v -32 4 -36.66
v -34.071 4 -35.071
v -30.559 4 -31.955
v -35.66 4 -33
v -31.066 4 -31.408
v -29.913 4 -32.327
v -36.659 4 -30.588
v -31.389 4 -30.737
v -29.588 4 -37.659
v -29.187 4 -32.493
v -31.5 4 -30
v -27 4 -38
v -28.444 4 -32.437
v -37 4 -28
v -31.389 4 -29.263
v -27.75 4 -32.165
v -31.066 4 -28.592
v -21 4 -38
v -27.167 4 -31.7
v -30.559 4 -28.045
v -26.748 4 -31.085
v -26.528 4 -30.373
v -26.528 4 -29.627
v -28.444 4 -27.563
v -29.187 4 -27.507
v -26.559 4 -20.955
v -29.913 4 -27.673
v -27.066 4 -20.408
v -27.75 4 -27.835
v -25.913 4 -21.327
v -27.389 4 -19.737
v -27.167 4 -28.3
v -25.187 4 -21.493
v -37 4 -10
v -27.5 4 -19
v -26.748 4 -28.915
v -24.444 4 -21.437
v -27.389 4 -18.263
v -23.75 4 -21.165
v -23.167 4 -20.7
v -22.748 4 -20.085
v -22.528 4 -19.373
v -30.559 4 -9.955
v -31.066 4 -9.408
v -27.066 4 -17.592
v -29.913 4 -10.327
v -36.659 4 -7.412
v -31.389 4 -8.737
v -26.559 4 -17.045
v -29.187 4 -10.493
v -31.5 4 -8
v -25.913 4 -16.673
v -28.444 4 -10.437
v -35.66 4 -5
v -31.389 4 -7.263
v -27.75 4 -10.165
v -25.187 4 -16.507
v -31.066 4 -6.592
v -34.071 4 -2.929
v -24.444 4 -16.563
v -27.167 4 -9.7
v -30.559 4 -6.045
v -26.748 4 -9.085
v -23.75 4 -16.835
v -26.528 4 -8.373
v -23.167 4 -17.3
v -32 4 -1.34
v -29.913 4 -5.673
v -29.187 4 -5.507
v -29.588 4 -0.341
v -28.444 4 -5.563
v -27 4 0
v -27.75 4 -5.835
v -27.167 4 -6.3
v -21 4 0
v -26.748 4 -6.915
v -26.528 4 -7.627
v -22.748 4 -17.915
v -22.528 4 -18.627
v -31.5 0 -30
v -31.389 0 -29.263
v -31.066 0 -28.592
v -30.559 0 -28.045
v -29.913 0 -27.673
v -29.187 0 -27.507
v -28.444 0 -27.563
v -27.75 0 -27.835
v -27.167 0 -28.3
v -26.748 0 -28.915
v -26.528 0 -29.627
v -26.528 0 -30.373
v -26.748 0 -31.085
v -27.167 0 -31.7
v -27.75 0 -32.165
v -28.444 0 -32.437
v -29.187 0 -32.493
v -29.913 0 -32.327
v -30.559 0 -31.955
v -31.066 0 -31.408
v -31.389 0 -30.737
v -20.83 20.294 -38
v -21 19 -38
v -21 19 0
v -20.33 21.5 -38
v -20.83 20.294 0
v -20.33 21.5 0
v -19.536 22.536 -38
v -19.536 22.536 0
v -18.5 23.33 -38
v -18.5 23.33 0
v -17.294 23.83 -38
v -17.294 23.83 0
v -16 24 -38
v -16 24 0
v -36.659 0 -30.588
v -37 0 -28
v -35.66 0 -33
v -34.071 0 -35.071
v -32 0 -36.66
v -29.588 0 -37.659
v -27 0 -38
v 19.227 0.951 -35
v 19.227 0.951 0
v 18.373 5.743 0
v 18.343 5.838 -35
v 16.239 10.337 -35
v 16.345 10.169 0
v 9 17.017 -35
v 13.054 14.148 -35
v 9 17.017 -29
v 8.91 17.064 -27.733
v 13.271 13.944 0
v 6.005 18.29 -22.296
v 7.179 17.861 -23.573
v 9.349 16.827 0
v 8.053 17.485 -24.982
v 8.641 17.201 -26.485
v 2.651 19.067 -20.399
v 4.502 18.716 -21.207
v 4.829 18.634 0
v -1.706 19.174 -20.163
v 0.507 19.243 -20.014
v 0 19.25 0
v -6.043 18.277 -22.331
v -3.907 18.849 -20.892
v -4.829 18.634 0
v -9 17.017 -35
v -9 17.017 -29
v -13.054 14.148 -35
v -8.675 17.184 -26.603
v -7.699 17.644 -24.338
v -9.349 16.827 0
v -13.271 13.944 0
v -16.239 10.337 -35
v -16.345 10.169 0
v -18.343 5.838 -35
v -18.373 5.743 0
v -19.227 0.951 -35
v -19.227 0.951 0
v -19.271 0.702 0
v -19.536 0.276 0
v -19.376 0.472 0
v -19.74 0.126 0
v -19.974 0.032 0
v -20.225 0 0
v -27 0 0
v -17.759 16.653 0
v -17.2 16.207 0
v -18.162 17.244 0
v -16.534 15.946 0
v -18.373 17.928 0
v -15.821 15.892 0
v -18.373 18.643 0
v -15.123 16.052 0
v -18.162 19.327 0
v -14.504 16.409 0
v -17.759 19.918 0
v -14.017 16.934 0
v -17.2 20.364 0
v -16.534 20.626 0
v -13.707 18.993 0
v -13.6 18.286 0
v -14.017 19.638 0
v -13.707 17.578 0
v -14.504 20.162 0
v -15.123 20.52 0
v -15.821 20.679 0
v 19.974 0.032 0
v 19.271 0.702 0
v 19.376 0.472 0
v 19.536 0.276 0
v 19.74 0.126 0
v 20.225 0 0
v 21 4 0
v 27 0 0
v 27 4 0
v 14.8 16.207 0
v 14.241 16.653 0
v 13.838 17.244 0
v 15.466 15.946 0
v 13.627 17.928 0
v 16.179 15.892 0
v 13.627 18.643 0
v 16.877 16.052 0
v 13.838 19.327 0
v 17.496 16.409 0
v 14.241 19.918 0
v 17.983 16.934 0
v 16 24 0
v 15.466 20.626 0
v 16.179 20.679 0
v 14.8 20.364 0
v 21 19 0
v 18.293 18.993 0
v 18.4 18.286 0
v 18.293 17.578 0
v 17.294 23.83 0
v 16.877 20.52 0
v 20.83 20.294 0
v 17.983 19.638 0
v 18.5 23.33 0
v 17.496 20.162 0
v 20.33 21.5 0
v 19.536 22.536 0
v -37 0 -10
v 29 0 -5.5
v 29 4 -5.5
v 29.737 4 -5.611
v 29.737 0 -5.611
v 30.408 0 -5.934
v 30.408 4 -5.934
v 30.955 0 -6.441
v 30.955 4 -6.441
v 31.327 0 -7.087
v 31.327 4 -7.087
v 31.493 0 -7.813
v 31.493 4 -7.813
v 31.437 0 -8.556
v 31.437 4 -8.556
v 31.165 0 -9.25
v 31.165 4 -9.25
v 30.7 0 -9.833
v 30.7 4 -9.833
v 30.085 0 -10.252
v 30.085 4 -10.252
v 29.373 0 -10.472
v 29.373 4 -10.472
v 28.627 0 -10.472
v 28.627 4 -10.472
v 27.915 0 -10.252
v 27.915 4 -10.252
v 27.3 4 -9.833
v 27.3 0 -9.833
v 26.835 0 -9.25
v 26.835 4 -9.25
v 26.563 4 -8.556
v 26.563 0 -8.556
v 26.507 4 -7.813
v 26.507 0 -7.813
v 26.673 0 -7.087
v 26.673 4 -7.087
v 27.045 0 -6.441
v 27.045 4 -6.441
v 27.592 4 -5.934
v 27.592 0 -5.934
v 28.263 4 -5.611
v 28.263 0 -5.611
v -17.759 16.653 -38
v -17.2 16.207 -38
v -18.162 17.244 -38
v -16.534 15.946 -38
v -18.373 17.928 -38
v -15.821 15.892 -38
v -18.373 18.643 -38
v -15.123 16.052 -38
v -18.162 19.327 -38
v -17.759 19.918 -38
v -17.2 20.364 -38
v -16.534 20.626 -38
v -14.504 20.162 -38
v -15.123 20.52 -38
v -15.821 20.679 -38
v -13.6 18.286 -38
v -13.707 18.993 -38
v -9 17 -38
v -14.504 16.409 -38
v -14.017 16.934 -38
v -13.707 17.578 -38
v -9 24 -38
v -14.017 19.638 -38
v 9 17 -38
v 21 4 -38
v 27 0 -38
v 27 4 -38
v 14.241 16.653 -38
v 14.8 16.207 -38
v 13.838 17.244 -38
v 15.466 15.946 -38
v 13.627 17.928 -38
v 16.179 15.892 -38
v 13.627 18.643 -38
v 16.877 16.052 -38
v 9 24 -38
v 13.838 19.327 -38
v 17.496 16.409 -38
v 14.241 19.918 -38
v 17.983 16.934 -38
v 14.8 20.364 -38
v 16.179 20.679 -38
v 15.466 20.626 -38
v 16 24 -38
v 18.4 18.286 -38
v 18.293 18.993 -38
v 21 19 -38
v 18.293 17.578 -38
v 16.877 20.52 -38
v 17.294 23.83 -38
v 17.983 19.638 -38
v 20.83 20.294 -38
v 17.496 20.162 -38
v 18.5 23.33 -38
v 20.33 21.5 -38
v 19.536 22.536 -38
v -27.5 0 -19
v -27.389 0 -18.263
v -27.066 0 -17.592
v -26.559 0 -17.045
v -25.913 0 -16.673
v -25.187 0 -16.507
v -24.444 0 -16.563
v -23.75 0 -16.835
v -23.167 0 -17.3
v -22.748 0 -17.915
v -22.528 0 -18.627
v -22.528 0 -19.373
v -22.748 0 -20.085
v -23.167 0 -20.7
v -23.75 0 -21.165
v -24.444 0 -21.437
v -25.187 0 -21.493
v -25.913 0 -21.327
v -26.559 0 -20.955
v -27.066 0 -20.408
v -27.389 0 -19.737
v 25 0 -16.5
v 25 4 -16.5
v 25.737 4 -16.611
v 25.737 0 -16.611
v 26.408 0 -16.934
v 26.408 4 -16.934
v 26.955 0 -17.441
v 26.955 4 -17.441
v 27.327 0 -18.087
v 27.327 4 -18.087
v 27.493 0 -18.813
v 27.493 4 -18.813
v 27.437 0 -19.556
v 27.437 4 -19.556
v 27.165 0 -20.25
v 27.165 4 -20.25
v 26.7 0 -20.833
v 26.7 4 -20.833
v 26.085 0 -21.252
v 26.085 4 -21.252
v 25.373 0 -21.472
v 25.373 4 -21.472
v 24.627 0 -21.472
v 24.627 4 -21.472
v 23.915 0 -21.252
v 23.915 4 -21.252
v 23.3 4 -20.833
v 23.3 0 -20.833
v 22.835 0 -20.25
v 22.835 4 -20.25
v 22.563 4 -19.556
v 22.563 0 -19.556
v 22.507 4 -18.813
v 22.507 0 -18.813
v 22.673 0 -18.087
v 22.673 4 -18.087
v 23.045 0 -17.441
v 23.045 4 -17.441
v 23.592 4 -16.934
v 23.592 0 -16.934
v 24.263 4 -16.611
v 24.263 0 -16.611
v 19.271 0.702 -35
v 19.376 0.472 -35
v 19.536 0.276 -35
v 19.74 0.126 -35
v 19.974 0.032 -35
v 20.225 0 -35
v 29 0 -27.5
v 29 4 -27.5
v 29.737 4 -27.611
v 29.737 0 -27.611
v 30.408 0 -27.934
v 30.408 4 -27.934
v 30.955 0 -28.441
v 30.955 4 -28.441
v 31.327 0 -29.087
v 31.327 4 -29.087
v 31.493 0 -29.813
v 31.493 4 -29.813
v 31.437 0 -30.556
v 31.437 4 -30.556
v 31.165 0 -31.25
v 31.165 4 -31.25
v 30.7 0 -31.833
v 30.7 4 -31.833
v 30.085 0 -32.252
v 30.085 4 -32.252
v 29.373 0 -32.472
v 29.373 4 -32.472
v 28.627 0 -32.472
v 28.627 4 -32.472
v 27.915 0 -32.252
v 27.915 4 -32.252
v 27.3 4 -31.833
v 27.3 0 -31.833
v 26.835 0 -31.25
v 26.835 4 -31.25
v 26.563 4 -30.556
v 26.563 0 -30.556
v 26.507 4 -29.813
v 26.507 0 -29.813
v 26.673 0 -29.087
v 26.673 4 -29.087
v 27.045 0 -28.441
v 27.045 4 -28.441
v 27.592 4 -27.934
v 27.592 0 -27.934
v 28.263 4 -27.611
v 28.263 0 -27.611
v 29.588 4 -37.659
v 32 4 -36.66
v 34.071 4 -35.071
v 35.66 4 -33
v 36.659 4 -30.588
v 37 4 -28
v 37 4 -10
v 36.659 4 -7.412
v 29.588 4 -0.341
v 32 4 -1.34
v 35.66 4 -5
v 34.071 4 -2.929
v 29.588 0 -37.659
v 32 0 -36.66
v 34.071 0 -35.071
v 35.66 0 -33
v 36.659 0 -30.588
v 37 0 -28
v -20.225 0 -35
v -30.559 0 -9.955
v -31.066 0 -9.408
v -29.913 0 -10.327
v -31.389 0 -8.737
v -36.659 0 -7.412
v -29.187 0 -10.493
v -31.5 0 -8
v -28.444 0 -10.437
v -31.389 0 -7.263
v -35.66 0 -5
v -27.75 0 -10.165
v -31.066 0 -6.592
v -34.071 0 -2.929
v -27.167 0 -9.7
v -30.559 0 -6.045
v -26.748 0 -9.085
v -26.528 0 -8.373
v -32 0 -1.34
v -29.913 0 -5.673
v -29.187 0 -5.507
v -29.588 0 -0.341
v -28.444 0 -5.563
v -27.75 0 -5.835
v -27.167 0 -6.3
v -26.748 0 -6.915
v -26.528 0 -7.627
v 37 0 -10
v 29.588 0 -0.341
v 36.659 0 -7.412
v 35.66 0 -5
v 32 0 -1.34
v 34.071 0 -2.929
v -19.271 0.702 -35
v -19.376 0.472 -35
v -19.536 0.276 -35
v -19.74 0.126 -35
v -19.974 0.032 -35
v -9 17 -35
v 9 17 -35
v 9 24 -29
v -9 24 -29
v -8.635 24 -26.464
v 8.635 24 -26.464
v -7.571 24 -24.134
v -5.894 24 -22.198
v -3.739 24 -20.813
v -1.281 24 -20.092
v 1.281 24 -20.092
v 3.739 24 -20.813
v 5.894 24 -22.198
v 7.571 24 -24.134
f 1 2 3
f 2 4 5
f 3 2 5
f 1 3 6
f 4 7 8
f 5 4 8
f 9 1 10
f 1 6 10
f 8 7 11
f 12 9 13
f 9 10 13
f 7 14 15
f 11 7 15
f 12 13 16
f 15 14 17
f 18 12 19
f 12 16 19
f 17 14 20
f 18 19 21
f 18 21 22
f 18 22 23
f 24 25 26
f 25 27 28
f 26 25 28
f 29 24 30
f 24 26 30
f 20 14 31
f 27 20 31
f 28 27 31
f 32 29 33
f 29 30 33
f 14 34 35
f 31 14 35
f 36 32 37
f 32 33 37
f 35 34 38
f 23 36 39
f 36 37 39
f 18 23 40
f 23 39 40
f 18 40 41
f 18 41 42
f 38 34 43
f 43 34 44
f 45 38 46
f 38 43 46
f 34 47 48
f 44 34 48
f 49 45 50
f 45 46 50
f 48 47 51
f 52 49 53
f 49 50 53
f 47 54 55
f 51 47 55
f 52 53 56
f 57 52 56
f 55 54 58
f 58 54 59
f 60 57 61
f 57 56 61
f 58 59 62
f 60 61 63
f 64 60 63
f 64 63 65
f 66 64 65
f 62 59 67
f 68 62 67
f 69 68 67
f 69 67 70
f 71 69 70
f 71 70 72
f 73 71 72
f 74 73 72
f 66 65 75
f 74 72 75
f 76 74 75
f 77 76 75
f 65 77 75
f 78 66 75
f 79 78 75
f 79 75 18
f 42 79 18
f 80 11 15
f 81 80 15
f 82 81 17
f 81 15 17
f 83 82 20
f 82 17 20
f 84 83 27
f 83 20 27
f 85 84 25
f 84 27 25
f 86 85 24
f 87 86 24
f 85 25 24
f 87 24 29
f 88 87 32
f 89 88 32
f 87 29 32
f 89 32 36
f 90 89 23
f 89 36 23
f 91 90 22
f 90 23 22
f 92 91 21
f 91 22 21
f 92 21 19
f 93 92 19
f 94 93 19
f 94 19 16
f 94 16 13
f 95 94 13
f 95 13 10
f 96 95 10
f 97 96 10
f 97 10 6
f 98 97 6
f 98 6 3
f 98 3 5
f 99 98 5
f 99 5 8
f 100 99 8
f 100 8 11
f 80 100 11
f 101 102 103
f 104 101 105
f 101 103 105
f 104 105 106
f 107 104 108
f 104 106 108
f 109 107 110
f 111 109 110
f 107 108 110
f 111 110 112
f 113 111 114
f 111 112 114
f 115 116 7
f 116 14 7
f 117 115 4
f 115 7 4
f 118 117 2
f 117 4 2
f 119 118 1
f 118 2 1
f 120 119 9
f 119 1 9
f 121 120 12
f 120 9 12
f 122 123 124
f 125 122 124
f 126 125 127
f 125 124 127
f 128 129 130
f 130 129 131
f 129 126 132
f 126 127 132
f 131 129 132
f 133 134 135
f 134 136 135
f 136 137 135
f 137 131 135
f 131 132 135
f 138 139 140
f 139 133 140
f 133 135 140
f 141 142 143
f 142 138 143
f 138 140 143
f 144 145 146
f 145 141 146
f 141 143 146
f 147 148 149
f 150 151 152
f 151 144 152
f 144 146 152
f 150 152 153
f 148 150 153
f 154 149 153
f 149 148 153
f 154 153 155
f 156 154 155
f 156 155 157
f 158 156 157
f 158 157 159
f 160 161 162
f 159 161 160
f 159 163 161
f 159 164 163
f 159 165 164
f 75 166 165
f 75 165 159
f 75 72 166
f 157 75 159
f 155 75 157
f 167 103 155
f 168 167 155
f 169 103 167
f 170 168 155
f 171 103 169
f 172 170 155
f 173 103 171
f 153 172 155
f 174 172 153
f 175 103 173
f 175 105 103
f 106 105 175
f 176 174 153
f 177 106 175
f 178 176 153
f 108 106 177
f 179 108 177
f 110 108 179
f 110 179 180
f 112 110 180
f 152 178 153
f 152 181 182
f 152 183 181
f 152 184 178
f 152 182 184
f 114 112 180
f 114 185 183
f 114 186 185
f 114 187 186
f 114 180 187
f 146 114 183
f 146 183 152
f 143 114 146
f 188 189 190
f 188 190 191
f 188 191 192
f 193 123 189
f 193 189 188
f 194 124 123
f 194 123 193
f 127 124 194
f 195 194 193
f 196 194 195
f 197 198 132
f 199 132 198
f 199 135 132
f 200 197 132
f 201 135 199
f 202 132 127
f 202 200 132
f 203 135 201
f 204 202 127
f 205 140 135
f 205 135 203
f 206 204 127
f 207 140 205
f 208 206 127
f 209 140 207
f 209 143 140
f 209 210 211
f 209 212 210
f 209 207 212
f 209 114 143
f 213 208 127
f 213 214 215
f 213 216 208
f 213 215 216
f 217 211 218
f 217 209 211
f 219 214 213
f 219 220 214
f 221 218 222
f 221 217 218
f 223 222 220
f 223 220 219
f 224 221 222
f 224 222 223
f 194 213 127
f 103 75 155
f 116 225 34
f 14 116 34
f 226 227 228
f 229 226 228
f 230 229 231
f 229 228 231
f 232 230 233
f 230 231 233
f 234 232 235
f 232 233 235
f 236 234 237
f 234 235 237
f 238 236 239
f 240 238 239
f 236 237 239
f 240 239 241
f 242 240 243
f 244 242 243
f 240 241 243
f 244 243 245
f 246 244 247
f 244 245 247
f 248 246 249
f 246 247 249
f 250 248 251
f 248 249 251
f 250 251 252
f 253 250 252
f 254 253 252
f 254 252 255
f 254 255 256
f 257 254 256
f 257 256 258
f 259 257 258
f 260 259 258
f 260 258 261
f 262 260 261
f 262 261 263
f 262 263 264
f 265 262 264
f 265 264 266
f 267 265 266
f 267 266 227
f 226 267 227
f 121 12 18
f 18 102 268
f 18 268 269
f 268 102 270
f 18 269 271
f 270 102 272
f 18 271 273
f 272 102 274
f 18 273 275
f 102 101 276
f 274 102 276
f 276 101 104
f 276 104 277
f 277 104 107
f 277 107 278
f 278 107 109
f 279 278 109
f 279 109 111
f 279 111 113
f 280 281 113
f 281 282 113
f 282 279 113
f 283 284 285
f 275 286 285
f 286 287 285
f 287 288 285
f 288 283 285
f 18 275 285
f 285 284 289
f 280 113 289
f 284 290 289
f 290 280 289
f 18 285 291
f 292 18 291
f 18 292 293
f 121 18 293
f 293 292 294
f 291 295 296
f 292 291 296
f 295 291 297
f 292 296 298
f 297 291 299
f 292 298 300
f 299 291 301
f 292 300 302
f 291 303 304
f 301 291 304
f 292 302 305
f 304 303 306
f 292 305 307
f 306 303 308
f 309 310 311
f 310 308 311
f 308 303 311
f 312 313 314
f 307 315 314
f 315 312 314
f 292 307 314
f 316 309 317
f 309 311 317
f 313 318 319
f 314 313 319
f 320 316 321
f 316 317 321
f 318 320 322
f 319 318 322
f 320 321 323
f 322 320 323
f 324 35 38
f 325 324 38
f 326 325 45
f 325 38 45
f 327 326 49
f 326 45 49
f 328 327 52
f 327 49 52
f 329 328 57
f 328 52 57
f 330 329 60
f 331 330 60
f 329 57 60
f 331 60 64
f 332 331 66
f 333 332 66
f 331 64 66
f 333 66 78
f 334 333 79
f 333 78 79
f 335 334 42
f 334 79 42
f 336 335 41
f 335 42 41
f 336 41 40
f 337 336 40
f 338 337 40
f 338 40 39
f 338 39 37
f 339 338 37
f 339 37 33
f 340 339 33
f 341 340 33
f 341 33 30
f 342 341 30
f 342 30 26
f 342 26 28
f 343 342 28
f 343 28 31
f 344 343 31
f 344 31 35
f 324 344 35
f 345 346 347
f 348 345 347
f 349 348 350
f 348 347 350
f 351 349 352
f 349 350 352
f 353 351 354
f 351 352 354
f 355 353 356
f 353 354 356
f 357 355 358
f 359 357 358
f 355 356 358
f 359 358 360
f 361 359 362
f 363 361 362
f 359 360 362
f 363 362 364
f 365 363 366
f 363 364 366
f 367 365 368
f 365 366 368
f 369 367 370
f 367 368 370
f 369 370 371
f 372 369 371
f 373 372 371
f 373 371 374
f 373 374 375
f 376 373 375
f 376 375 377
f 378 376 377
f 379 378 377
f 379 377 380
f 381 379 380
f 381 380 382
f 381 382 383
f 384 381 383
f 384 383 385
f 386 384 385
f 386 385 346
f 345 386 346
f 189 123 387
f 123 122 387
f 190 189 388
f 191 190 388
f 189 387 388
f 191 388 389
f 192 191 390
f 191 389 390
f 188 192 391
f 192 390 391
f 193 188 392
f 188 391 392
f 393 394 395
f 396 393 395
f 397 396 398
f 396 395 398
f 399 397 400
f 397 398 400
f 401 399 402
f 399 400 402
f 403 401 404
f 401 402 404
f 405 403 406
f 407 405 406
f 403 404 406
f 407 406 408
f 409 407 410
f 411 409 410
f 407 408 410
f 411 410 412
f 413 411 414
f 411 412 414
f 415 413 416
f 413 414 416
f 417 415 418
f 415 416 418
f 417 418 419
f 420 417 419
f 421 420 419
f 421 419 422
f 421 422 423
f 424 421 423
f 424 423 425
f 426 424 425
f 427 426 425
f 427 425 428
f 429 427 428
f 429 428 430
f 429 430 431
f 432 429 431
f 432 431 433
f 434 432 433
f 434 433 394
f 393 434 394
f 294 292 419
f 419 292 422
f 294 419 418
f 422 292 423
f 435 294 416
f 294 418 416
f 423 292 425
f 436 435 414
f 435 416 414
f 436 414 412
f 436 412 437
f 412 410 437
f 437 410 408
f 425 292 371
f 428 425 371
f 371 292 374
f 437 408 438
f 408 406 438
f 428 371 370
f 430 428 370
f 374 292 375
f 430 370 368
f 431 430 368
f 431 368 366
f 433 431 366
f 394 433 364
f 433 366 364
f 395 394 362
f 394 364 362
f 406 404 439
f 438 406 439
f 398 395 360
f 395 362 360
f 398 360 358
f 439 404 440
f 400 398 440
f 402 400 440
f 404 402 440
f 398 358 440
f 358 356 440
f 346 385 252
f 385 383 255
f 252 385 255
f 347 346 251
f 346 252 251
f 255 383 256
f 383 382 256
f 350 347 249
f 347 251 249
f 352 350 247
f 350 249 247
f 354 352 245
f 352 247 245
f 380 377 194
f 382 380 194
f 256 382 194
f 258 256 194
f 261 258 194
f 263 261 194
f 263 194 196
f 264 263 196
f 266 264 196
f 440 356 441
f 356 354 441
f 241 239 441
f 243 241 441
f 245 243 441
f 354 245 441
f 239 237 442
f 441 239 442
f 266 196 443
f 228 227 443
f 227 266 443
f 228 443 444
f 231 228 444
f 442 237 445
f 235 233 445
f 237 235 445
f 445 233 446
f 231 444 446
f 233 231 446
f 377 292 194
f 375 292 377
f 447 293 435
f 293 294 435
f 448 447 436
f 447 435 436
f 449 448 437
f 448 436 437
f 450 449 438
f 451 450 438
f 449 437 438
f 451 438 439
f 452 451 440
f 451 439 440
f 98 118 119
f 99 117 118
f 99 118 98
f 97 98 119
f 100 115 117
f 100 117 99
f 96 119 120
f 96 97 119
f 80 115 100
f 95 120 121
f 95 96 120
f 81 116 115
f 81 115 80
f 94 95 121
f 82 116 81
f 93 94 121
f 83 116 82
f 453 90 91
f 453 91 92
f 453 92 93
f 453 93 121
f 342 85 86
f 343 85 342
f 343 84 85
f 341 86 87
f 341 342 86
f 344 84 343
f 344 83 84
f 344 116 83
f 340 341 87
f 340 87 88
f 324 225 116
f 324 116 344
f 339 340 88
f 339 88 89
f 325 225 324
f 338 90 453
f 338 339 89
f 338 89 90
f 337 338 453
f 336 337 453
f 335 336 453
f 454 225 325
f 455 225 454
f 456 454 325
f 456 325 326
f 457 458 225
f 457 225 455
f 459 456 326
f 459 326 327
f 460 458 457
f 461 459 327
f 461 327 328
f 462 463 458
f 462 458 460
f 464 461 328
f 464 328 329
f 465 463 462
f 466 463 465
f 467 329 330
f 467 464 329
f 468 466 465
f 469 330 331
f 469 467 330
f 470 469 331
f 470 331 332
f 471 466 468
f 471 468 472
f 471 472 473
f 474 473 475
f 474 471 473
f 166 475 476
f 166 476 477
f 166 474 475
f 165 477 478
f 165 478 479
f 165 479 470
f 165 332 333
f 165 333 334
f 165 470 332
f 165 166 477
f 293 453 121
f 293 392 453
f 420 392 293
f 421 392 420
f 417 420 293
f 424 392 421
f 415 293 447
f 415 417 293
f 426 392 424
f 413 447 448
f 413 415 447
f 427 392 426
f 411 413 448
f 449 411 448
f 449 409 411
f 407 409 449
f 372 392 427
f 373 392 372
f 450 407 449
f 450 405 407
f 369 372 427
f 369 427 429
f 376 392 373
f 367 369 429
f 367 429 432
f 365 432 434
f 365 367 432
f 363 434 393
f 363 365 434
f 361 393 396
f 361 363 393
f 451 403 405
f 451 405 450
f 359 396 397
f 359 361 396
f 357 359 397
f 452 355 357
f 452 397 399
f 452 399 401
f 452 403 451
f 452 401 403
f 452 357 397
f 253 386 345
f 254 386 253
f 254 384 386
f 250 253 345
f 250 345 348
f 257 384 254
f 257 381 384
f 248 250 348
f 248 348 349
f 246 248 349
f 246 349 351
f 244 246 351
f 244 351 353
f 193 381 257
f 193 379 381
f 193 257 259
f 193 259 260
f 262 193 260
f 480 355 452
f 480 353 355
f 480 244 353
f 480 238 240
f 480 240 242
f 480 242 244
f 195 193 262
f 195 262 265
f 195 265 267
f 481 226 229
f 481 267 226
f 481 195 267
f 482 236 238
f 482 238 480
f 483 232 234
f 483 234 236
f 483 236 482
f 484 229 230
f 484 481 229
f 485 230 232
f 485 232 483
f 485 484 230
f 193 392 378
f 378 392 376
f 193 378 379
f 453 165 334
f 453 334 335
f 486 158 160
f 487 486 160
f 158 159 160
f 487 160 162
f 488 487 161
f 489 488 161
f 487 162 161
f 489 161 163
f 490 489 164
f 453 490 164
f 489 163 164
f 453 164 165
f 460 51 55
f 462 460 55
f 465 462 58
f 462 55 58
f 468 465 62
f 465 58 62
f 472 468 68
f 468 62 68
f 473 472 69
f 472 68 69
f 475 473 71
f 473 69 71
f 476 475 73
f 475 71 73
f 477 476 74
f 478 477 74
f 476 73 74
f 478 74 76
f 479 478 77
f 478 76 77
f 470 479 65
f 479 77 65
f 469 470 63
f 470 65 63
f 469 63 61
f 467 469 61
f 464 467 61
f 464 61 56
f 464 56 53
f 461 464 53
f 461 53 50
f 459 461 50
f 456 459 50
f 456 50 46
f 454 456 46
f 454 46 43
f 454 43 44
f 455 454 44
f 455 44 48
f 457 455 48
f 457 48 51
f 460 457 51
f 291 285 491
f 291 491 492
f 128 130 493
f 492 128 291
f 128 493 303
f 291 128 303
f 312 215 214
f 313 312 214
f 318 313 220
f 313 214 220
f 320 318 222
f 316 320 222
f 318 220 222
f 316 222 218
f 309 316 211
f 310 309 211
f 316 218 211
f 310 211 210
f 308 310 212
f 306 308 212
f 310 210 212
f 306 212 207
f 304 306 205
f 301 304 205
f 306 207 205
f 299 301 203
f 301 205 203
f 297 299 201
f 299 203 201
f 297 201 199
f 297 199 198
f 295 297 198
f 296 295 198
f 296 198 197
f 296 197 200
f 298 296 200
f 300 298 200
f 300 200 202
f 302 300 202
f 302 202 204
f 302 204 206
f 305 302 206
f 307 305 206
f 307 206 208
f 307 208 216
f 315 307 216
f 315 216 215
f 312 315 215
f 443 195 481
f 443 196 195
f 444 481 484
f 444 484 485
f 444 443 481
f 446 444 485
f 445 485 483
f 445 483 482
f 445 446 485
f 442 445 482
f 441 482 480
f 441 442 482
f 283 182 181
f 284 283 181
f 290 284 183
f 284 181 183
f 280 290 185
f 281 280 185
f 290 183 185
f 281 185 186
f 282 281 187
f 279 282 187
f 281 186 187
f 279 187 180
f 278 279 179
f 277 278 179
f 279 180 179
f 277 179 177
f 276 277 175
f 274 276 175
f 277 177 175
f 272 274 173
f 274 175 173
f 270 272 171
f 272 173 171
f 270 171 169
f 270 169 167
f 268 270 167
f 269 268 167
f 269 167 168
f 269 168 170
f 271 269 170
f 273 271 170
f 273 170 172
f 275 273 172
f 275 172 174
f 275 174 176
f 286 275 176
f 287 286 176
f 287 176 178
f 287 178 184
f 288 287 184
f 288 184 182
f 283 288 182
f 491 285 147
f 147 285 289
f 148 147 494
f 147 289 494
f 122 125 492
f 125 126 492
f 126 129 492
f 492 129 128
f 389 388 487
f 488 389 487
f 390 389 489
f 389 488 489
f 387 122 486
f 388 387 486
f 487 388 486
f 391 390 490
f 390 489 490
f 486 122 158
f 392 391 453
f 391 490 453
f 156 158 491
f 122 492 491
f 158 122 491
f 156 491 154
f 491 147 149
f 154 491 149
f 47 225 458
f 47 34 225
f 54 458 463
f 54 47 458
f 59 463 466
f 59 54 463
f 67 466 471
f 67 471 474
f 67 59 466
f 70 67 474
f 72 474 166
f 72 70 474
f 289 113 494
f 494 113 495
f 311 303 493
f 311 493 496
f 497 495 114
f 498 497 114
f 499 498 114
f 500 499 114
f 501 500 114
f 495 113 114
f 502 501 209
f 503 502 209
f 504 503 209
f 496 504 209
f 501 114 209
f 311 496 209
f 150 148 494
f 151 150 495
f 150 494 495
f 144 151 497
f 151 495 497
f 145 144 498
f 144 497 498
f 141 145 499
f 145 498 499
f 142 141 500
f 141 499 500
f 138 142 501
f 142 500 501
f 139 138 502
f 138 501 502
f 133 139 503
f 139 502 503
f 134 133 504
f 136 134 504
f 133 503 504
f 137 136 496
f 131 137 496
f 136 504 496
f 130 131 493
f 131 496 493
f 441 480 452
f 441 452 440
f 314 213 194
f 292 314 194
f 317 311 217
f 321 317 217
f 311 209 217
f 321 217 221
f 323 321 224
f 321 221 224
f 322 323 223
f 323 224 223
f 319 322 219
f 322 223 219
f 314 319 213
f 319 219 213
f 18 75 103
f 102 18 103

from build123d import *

# Parameters (mm, degrees)
SKETCH1_W           = 42
SKETCH1_H           = 48
SKETCH1_R           = 19.25
SKETCH1_R_2         = 2.4
BOSS_EXTRUDE1_DEPTH = 35
SKETCH4_W           = 19
SKETCH4_H           = 5
BOSS_EXTRUDE3_DEPTH = 35
CUT_EXTRUDE1_REACH  = 70.367
SKETCH5_R           = 2.5
BOSS_EXTRUDE4_DEPTH = 3
CUT_EXTRUDE2_REACH  = 62.166
SKETCH9_W           = 16
SKETCH9_H           = 4
BOSS_EXTRUDE6_DEPTH = 38
CUT_EXTRUDE3_REACH  = 58.683
SKETCH10_R          = 2.5
FILLET1_R           = 10
FILLET2_R           = 5
SKETCH11_R          = 2.4
CUT_EXTRUDE4_DEPTH  = 57.302753041
FILLET3_R           = 1
CUT_EXTRUDE7_DEPTH  = 7


with BuildPart() as part:
    # Sketch1 → Boss-Extrude1 (new body)
    with BuildSketch(Plane.XY):
        Rectangle(SKETCH1_W, SKETCH1_H)
        Circle(SKETCH1_R, mode=Mode.SUBTRACT)
        with Locations((-16, 18.285714286)):
            Circle(SKETCH1_R_2, mode=Mode.SUBTRACT)
        with Locations((16, 18.285714286)):
            Circle(SKETCH1_R_2, mode=Mode.SUBTRACT)
        with Locations((16, -18.285714286)):
            Circle(SKETCH1_R_2, mode=Mode.SUBTRACT)
        with Locations((-16, -18.285714286)):
            Circle(SKETCH1_R_2, mode=Mode.SUBTRACT)
    extrude(amount=-BOSS_EXTRUDE1_DEPTH)

    # Sketch4 → Boss-Extrude3 (add)
    with BuildSketch(Plane.XY):
        with Locations((-30.5, -21.5)):
            Rectangle(SKETCH4_W, SKETCH4_H)
        with Locations((30.5, -21.5)):
            Rectangle(SKETCH4_W, SKETCH4_H)
    extrude(amount=-BOSS_EXTRUDE3_DEPTH)

    # Sketch5 → Cut-Extrude1 (cut, up to next)
    with BuildSketch(Plane(origin=(0, -19, 0), x_dir=(1, 0, 0), z_dir=(0, 1, 0)), mode=Mode.PRIVATE) as cut_extrude1_sk1:
        with Locations(Location((-25, 19, 0), (0, 0, 270))):
            Circle(SKETCH5_R)
    cut_extrude1_tool1 = extrude(cut_extrude1_sk1.sketch, amount=-CUT_EXTRUDE1_REACH, mode=Mode.PRIVATE) & part.part
    # Sketch5 → Cut-Extrude1 (cut, up to next)
    with BuildSketch(Plane(origin=(0, -19, 0), x_dir=(1, 0, 0), z_dir=(0, 1, 0)), mode=Mode.PRIVATE) as cut_extrude1_sk2:
        with Locations(Location((25, 19, 0), (0, 0, 270))):
            Circle(SKETCH5_R)
    cut_extrude1_tool2 = extrude(cut_extrude1_sk2.sketch, amount=-CUT_EXTRUDE1_REACH, mode=Mode.PRIVATE) & part.part
    add(cut_extrude1_tool1.solids().sort_by_distance((-25, -19, -19))[0], mode=Mode.SUBTRACT)
    add(cut_extrude1_tool2.solids().sort_by_distance((25, -19, -19))[0], mode=Mode.SUBTRACT)

    # Sketch6 → Boss-Extrude4 (add)
    with BuildSketch(Plane(origin=(0, 0, -35), x_dir=(-1, 0, 0), z_dir=(0, 0, -1))):
        Polygon((-21, 24), (-21, -19), (-40, -19), (-40, -24), (40, -24), (40, -19), (21, -19), (21, 24), align=None)
    extrude(amount=BOSS_EXTRUDE4_DEPTH)

    # Sketch7 → Cut-Extrude2 (cut, up to next)
    with BuildSketch(Plane.XY, mode=Mode.PRIVATE) as cut_extrude2_sk1:
        Polygon((-21, 0), (21, 0), (21, -19), (40, -19), (40, -24), (-40, -24), (-40, -19), (-21, -19), align=None)
    cut_extrude2_tool1 = extrude(cut_extrude2_sk1.sketch, amount=-CUT_EXTRUDE2_REACH, mode=Mode.PRIVATE) & part.part
    add(cut_extrude2_tool1.solids().sort_by_distance((0, -13.506678, 0))[0], mode=Mode.SUBTRACT)

    # Sketch9 → Boss-Extrude6 (add)
    with BuildSketch(Plane.XY):
        with Locations((-29, 2)):
            Rectangle(SKETCH9_W, SKETCH9_H)
        with Locations((29, 2)):
            Rectangle(SKETCH9_W, SKETCH9_H)
    extrude(amount=-BOSS_EXTRUDE6_DEPTH)

    # Sketch10 → Cut-Extrude3 (cut, up to next)
    with BuildSketch(Plane(origin=(0, 4, 0), x_dir=(1, 0, 0), z_dir=(0, 1, 0)), mode=Mode.PRIVATE) as cut_extrude3_sk1:
        with Locations(Location((-29, 8, 0), (0, 0, 180))):
            Circle(SKETCH10_R)
    cut_extrude3_tool1 = extrude(cut_extrude3_sk1.sketch, amount=-CUT_EXTRUDE3_REACH, mode=Mode.PRIVATE) & part.part
    # Sketch10 → Cut-Extrude3 (cut, up to next)
    with BuildSketch(Plane(origin=(0, 4, 0), x_dir=(1, 0, 0), z_dir=(0, 1, 0)), mode=Mode.PRIVATE) as cut_extrude3_sk2:
        with Locations(Location((-29, 30, 0), (0, 0, 180))):
            Circle(SKETCH10_R)
    cut_extrude3_tool2 = extrude(cut_extrude3_sk2.sketch, amount=-CUT_EXTRUDE3_REACH, mode=Mode.PRIVATE) & part.part
    # Sketch10 → Cut-Extrude3 (cut, up to next)
    with BuildSketch(Plane(origin=(0, 4, 0), x_dir=(1, 0, 0), z_dir=(0, 1, 0)), mode=Mode.PRIVATE) as cut_extrude3_sk3:
        with Locations(Location((29, 30, 0), (0, 0, 270))):
            Circle(SKETCH10_R)
    cut_extrude3_tool3 = extrude(cut_extrude3_sk3.sketch, amount=-CUT_EXTRUDE3_REACH, mode=Mode.PRIVATE) & part.part
    # Sketch10 → Cut-Extrude3 (cut, up to next)
    with BuildSketch(Plane(origin=(0, 4, 0), x_dir=(1, 0, 0), z_dir=(0, 1, 0)), mode=Mode.PRIVATE) as cut_extrude3_sk4:
        with Locations(Location((29, 8, 0), (0, 0, 270))):
            Circle(SKETCH10_R)
    cut_extrude3_tool4 = extrude(cut_extrude3_sk4.sketch, amount=-CUT_EXTRUDE3_REACH, mode=Mode.PRIVATE) & part.part
    # Sketch10 → Cut-Extrude3 (cut, up to next)
    with BuildSketch(Plane(origin=(0, 4, 0), x_dir=(1, 0, 0), z_dir=(0, 1, 0)), mode=Mode.PRIVATE) as cut_extrude3_sk5:
        with Locations(Location((-25, 19, 0), (0, 0, 180))):
            Circle(SKETCH10_R)
    cut_extrude3_tool5 = extrude(cut_extrude3_sk5.sketch, amount=-CUT_EXTRUDE3_REACH, mode=Mode.PRIVATE) & part.part
    # Sketch10 → Cut-Extrude3 (cut, up to next)
    with BuildSketch(Plane(origin=(0, 4, 0), x_dir=(1, 0, 0), z_dir=(0, 1, 0)), mode=Mode.PRIVATE) as cut_extrude3_sk6:
        with Locations(Location((25, 19, 0), (0, 0, 270))):
            Circle(SKETCH10_R)
    cut_extrude3_tool6 = extrude(cut_extrude3_sk6.sketch, amount=-CUT_EXTRUDE3_REACH, mode=Mode.PRIVATE) & part.part
    add(cut_extrude3_tool1.solids().sort_by_distance((-29, 4, -8))[0], mode=Mode.SUBTRACT)
    add(cut_extrude3_tool2.solids().sort_by_distance((-29, 4, -30))[0], mode=Mode.SUBTRACT)
    add(cut_extrude3_tool3.solids().sort_by_distance((29, 4, -30))[0], mode=Mode.SUBTRACT)
    add(cut_extrude3_tool4.solids().sort_by_distance((29, 4, -8))[0], mode=Mode.SUBTRACT)
    add(cut_extrude3_tool5.solids().sort_by_distance((-25, 4, -19))[0], mode=Mode.SUBTRACT)
    add(cut_extrude3_tool6.solids().sort_by_distance((25, 4, -19))[0], mode=Mode.SUBTRACT)

    # Fillet1
    fillet1_edges = [part.edges().sort_by_distance(p)[0] for p in [
        (-37, 2, 0),
        (-37, 2, -38),
        (37, 2, 0),
        (37, 2, -38),
    ]]
    fillet(fillet1_edges, radius=FILLET1_R)

    # Fillet2
    fillet2_edges = [part.edges().sort_by_distance(p)[0] for p in [
        (-21, 24, -19),
        (21, 24, -19),
    ]]
    fillet(fillet2_edges, radius=FILLET2_R)

    # Sketch11 → Cut-Extrude4 (cut, through all)
    with BuildSketch(Plane.XY.offset(-35)):
        with Locations((16, 18.285714286)):
            Circle(SKETCH11_R)
        with Locations((-16, 18.285714286)):
            Circle(SKETCH11_R)
    extrude(amount=-CUT_EXTRUDE4_DEPTH, mode=Mode.SUBTRACT)

    # Fillet3
    fillet3_edges = [part.edges().sort_by_distance(p)[0] for p in [
        (-19.25, 0, -17.5),
        (19.25, 0, -17.5),
    ]]
    fillet(fillet3_edges, radius=FILLET3_R)

    # Sketch12 → Cut-Extrude7 (cut)
    with BuildSketch(Plane(origin=(0, 24, 0), x_dir=(1, 0, 0), z_dir=(0, 1, 0))):
        with BuildLine():
            ThreePointArc((1.6e-08, 38), (-6.363961025, 35.363961036), (-9, 29))
            Line((-9, 29), (9, 29))
            ThreePointArc((9, 29), (6.363961036, 35.363961025), (1.6e-08, 38))
        make_face()
        with BuildLine():
            Line((9, 29), (-9, 29))
            ThreePointArc((-9, 29), (0, 20), (9, 29))
        make_face()
        with BuildLine():
            ThreePointArc((1.6e-08, 38), (6.363961036, 35.363961025), (9, 29))
            Line((9, 29), (9, 38))
            Line((9, 38), (1.6e-08, 38))
        make_face()
        with BuildLine():
            Line((-9, 38), (-9, 29))
            ThreePointArc((-9, 29), (-6.363961025, 35.363961036), (1.6e-08, 38))
            Line((1.6e-08, 38), (-9, 38))
        make_face()
    extrude(amount=-CUT_EXTRUDE7_DEPTH, mode=Mode.SUBTRACT)


solid = part.part
